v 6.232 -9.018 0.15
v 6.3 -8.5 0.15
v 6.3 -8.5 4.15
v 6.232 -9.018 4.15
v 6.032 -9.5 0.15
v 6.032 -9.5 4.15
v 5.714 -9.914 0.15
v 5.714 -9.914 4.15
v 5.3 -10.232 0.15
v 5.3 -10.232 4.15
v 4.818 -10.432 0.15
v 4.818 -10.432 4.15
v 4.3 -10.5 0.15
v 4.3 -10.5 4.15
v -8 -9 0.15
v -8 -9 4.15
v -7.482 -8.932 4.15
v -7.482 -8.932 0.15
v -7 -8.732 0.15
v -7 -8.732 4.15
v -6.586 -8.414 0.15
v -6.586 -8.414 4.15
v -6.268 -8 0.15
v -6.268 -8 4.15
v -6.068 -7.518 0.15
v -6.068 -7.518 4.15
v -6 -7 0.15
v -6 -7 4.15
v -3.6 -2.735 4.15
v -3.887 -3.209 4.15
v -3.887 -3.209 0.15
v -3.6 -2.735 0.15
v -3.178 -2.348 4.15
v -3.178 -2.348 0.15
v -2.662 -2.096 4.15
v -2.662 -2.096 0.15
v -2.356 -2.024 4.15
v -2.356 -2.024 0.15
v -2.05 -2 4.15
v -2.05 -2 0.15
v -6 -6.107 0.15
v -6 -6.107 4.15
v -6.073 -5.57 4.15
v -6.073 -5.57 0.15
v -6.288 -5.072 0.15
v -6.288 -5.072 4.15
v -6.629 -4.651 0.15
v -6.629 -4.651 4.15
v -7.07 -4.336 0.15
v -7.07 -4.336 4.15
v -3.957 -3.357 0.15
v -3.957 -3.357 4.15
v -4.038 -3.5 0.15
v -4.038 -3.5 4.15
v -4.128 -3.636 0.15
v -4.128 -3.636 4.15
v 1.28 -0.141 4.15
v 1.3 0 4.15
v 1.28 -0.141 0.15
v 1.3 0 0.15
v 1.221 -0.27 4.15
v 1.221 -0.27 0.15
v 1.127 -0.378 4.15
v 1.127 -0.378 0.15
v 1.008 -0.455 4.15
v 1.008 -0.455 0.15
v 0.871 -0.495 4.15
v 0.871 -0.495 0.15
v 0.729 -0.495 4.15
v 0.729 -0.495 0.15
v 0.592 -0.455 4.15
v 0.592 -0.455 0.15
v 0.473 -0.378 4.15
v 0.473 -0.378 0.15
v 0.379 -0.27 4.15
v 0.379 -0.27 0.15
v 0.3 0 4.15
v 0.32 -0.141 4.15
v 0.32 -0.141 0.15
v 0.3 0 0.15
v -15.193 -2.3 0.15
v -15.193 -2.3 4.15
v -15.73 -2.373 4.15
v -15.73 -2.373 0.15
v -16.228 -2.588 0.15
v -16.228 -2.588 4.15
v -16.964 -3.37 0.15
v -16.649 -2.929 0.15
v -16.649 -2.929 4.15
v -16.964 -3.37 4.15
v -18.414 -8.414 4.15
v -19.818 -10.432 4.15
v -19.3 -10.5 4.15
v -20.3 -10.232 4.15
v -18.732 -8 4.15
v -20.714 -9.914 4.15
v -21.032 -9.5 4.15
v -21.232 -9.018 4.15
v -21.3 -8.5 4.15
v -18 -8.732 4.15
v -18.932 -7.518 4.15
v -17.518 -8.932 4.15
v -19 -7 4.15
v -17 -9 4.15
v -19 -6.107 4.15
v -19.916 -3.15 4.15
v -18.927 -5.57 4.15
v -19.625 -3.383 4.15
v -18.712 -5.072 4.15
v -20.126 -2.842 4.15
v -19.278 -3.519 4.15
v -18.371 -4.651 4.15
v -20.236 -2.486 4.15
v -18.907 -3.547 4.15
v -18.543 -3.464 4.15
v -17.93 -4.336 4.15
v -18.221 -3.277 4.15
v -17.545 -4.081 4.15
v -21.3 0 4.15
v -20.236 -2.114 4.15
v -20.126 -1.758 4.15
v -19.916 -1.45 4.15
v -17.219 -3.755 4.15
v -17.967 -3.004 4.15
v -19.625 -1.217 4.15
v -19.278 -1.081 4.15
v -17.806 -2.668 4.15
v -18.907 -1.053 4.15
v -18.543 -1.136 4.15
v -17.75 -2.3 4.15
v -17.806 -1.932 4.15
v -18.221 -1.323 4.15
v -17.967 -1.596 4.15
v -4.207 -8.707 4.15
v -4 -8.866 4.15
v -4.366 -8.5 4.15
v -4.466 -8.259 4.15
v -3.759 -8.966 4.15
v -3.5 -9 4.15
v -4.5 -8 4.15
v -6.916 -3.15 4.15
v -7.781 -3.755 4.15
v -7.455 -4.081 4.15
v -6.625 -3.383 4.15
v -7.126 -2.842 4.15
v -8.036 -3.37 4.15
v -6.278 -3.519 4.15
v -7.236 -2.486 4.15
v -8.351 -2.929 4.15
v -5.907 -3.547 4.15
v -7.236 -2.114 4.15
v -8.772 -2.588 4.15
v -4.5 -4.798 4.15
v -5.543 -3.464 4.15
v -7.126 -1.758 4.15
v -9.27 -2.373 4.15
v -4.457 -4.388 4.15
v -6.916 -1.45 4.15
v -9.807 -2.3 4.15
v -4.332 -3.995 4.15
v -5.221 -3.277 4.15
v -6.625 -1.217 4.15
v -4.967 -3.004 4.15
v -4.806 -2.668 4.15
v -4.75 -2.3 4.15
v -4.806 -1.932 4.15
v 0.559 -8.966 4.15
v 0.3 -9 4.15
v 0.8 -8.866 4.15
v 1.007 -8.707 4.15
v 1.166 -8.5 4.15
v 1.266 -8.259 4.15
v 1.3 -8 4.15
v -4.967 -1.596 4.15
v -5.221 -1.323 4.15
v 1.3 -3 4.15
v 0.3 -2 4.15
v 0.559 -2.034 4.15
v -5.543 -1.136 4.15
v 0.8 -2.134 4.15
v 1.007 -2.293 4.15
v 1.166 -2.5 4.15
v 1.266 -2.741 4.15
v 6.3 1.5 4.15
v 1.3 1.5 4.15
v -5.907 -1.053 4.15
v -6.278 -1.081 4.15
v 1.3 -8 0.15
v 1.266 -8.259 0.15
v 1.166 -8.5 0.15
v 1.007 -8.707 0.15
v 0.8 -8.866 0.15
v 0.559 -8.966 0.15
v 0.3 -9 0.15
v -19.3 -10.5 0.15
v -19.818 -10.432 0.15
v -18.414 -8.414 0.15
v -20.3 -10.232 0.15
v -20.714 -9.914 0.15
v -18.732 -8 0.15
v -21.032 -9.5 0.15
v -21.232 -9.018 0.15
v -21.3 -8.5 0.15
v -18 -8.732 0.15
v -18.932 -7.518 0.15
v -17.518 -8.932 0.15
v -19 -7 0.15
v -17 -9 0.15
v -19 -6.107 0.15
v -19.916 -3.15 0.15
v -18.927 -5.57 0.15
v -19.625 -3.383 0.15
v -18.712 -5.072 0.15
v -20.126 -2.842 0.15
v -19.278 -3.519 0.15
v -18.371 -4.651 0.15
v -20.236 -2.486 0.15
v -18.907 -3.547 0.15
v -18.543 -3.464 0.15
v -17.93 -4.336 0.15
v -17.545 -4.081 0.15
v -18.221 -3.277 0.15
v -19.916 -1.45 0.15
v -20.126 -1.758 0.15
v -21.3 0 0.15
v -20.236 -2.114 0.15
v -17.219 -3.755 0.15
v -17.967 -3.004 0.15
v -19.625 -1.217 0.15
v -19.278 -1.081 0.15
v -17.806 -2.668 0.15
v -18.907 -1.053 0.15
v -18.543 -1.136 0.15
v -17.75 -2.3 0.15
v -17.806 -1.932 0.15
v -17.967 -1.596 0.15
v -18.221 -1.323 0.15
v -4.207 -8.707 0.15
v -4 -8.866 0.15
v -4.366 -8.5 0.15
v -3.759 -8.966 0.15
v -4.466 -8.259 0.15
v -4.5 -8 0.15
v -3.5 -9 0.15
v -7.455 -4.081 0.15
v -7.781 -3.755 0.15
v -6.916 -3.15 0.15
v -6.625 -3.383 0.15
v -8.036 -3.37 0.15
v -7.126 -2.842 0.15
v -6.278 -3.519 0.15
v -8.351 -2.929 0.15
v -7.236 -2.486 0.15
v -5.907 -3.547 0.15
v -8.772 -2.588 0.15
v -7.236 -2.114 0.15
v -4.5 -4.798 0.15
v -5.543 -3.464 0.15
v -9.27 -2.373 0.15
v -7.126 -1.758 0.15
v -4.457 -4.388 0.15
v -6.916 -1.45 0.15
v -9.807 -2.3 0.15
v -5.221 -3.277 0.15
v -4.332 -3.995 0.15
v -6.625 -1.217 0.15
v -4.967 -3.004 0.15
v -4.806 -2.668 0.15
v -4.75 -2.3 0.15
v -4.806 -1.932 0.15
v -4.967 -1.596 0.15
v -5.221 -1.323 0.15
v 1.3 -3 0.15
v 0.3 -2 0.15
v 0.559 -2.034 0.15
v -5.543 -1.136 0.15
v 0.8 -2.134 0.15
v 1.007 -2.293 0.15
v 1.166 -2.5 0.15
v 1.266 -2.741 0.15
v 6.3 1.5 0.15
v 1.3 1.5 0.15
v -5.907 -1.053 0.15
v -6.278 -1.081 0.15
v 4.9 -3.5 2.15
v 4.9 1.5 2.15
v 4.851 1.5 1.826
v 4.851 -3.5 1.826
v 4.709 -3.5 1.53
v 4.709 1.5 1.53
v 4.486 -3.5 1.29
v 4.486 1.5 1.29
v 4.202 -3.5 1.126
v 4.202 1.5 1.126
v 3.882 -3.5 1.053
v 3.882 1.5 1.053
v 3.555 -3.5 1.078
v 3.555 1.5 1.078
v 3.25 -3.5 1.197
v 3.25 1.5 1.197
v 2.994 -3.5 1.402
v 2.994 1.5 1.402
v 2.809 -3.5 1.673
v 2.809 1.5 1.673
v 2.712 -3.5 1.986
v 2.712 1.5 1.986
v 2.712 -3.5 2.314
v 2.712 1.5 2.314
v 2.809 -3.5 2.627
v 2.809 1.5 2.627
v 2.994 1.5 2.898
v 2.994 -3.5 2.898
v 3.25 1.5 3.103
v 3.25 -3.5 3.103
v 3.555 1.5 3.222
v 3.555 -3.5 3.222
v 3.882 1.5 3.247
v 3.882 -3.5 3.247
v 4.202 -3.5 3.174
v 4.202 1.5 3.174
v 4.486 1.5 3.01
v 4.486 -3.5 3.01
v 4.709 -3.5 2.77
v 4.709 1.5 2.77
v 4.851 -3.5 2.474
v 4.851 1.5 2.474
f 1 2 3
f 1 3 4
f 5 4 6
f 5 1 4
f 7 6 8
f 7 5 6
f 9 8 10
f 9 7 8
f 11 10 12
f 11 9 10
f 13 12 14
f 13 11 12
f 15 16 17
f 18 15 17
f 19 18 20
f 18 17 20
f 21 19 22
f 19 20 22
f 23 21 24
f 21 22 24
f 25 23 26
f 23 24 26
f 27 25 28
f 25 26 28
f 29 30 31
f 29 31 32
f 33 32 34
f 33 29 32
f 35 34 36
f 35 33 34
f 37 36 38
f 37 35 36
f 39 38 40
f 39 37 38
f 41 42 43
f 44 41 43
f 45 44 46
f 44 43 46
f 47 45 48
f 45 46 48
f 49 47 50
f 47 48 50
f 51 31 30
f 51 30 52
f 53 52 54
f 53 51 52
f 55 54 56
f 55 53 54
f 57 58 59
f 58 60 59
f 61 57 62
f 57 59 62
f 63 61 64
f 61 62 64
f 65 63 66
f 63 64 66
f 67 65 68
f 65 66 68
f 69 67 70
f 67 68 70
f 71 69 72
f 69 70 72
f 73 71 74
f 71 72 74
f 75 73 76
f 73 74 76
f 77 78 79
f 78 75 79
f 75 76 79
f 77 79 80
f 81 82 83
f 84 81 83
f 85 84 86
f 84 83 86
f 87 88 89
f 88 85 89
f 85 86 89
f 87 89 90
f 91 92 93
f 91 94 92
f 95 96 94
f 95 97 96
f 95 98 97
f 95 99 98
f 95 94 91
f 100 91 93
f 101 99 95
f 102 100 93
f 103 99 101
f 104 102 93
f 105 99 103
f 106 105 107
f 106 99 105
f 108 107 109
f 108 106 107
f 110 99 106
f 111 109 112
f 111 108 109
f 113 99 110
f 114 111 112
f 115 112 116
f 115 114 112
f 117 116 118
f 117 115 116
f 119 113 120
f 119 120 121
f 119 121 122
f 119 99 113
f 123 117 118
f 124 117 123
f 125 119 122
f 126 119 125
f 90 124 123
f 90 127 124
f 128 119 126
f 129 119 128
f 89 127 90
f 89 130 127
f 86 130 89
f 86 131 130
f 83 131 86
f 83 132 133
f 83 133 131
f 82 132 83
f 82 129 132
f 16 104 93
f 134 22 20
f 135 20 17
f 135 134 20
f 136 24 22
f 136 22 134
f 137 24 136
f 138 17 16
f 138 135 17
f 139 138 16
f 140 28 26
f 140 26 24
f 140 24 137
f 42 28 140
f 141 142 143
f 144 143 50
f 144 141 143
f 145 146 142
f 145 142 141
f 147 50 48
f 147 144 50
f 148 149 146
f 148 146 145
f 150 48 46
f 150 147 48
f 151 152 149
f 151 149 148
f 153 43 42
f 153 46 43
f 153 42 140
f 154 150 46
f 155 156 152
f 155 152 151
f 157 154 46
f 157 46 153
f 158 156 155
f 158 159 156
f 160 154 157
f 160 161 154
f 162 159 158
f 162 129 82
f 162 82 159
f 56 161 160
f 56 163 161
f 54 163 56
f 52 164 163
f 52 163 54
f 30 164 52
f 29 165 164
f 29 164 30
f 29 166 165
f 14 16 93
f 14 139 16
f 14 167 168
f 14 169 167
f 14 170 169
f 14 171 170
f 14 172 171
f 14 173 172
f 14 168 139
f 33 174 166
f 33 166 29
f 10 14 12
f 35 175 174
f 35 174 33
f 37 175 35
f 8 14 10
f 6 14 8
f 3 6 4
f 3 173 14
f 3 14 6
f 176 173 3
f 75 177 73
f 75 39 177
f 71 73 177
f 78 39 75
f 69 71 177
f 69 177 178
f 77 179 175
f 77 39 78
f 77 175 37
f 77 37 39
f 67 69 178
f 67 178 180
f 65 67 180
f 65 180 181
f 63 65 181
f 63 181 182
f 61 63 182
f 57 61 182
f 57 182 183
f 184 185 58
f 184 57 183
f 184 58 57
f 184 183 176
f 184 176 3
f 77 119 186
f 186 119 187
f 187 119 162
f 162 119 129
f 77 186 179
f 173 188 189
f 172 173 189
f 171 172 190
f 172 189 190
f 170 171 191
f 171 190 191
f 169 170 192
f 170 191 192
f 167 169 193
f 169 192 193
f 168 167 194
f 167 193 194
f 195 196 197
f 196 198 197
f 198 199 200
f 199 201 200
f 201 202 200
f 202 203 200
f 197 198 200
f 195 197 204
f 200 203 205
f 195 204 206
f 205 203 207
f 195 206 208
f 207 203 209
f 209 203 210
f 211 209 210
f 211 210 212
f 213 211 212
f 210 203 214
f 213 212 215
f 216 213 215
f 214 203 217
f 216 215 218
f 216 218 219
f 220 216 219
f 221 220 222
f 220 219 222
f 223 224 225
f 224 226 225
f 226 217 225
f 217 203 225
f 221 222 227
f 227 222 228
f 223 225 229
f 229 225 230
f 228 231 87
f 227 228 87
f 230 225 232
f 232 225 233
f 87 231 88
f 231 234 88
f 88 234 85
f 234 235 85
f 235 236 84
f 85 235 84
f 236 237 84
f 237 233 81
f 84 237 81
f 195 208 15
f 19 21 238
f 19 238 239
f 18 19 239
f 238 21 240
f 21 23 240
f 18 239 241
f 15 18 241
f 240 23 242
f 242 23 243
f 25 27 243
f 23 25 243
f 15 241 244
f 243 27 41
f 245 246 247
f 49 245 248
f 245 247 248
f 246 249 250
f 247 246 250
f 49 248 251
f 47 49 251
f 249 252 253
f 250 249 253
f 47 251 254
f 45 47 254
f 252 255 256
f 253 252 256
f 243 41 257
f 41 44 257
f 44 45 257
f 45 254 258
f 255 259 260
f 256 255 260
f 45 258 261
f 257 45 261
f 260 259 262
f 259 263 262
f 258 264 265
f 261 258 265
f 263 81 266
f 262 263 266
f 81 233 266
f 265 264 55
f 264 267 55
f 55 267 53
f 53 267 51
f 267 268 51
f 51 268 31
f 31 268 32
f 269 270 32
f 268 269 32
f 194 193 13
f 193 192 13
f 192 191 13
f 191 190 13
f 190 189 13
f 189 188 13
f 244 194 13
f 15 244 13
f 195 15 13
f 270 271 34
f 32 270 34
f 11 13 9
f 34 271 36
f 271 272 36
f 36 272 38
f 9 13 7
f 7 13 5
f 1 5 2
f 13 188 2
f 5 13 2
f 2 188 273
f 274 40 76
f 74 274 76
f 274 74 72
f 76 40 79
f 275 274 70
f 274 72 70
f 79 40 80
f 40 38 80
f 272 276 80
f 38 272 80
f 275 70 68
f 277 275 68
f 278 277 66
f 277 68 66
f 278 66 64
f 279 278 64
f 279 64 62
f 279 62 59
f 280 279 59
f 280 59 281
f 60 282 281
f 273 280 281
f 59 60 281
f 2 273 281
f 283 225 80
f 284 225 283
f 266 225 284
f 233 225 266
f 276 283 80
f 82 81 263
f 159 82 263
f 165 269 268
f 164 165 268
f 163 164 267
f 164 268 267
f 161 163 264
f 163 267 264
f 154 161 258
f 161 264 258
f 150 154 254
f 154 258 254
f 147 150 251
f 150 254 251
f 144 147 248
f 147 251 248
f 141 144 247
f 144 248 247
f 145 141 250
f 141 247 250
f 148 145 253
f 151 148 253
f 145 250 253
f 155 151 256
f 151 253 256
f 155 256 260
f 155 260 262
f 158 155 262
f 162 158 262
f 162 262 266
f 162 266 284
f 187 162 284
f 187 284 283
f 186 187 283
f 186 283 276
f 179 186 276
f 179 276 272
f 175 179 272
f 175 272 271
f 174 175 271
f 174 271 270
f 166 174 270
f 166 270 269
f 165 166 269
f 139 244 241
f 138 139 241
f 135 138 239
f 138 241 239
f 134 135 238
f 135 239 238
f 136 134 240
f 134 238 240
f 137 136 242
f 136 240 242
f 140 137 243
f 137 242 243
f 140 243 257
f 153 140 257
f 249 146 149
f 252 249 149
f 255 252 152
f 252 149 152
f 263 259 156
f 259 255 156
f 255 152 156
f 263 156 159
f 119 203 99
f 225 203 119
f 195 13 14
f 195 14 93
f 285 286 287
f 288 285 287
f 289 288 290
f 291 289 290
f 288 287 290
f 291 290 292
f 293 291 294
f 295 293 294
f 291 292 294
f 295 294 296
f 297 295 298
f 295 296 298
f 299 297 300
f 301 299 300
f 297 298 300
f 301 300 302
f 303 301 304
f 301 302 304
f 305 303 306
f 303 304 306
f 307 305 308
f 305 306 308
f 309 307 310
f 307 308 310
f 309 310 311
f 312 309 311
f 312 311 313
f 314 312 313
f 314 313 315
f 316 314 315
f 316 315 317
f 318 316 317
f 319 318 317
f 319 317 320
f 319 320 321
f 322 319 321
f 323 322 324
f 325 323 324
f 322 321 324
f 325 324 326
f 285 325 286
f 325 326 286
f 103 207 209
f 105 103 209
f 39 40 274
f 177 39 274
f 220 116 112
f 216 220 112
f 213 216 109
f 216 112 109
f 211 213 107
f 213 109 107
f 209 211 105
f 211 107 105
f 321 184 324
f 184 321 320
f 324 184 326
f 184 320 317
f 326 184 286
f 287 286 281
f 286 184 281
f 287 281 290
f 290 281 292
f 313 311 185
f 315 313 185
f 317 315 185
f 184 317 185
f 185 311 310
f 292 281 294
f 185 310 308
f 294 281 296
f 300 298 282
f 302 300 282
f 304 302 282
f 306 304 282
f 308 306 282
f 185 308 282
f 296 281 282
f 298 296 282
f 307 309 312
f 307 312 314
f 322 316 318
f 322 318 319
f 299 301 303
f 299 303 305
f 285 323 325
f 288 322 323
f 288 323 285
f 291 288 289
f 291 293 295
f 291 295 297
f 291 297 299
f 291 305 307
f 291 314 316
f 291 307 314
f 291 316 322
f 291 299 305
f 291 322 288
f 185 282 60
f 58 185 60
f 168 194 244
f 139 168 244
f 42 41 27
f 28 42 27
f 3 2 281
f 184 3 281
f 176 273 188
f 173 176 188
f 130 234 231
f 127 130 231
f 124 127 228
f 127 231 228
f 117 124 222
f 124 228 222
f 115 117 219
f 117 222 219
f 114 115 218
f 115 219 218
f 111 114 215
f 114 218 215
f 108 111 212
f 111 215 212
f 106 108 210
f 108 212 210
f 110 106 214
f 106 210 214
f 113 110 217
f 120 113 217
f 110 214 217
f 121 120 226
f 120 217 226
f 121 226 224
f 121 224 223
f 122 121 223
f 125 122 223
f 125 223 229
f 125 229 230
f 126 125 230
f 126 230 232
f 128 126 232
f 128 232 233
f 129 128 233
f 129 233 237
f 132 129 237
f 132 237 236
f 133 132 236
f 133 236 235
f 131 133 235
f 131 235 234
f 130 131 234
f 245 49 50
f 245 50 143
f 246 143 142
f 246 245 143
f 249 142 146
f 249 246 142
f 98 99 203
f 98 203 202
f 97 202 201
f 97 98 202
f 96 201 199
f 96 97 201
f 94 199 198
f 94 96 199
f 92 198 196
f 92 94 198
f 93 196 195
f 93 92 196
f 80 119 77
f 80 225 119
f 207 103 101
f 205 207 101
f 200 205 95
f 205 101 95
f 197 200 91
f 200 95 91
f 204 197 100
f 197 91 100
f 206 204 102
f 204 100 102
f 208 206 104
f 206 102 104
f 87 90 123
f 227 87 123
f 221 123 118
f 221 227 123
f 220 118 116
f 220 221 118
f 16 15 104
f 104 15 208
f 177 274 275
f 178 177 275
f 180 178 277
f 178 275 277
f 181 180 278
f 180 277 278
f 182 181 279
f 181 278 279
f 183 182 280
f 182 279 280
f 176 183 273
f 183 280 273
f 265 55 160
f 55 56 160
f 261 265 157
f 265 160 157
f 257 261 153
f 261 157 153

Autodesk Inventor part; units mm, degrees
ref_plane "YZ Plane" through (0, 0, 0) normal (1, 0, 0) x (0, 1, 0)
ref_plane "XZ Plane" through (0, 0, 0) normal (0, 1, 0) x (-1, 0, 0)
ref_plane "作業平面1" through (0, 0, 0.15) normal (0, 0, 1) x (1, 0, 0)
sketch "スケッチ1" plane through (0, 0, 0.15) normal (0, 0, 1) x (1, 0, 0)
  line L0 (0, -24) -> (-27.3, -24) projected
  line L1 (-3.7, -24) -> (-3.7, -10.5)
  line L2 (-3.7, -10.5) -> (4.3, -10.5)
  line L3 (6.3, -8.5) -> (6.3, 1.5)
  line L4 (6.3, 1.5) -> (1.3, 1.5)
  line L5 (-27.3, 0) -> (0, 0) projected
  line L6 (1.3, 1.5) -> (1.3, 0)
  circle A0 centre (-6, -21.7) radius 1.25 projected
  circle A1 centre (-19, -21.7) radius 1.25 projected
  circle A2 centre (-6, -21.7) radius 2.3 construction
  circle A3 centre (-19, -21.7) radius 2.3 construction
  line L7 (1.3, 0) -> (0, 0)
  line L8 (-21.3, -24) -> (-21.3, 0)
  circle A4 centre (-6, -2.3) radius 1.25 projected
  circle A5 centre (-19, -2.3) radius 1.25 projected
  line L9 (1.3, 0) -> (0.8, 0)
  arc A6 (0.3, 0) -> (1.3, 0) centre (0.8, 0) ccw
  line L10 (-6, -21.7) -> (-19, -21.7)
  line L11 (-19, -21.7) -> (-19, -2.3)
  line L12 (-19, -2.3) -> (-6, -2.3)
  line L13 (-6, -2.3) -> (-6, -21.7)
  arc A7 (-6, -19.4) -> (-8.3, -21.7) centre (-6, -21.7) ccw
  arc A8 (-16.7, -21.7) -> (-19, -19.4) centre (-19, -21.7) ccw
  arc A9 (-19, -4.6) -> (-16.7, -2.3) centre (-19, -2.3) ccw
  arc A10 (-8.3, -2.3) -> (-6, -4.6) centre (-6, -2.3) ccw
  arc A11 (4.3, -10.5) -> (6.3, -8.5) centre (4.3, -8.5) ccw
  line L14 (-3.5, -2) -> (0.3, -2)
  line L15 (1.3, -3) -> (1.3, -8)
  line L16 (0.3, -9) -> (-3.5, -9)
  line L17 (-4.5, -8) -> (-4.5, -3)
  arc A12 (0.3, -9) -> (1.3, -8) centre (0.3, -8) ccw
  arc A13 (1.3, -3) -> (0.3, -2) centre (0.3, -3) ccw
  arc A14 (-3.5, -2) -> (-4.5, -3) centre (-3.5, -3) ccw
  arc A15 (-4.5, -8) -> (-3.5, -9) centre (-3.5, -8) ccw
  arc A16 (-4.5, -4.0436) -> (-3.7196, -2) centre (-6, -2.3) ccw
  line L18 (-3.7, -10.5) -> (-21.3, -10.5)
  line L19 (-3.5, -9) -> (-21.3, -9)
  point P0 (6.3, -10.5)
  point P1 (0.8, -0.5)
  point P2 (-3.7167, -2.0238)
  point P3 (-6, -9)
  point P4 (-19, -9)
  dimension "d0" = 1.5
  dimension "d1" = 12
  dimension "d2" = 10
  dimension "d3" = 5
  dimension "d9" = 0.5
  dimension "d13" = 2
  dimension "d14" = 1
  dimension "d15" = 1.5
  dimension "d16" = 1.5
  dimension "d17" = 5
  dimension "d18" = 1.5
extrude "押し出し1" add sketch "スケッチ1" along normal blind 4 contours L18 L13 A4 L12 A5 L11 L19 L8 L5 L7 A6 L6 L4 L3 A11 L2 | L8 L19 L11 L18 | L18 L11 L19 L13 | A10 L12 A4 L13 | L11 A5 L12 A9 | L17 A14 A16
sketch "スケッチ2" plane through (1.3, 1.5, 0.15) normal (0, 1, 0) x (1, 0, 0)
  line L0 (5, 0) -> (5, -4) projected
  line L1 (0, 0) -> (-22.6, 0) projected
  line L2 (5, -4) -> (0, 0) construction
  circle A0 centre (2.5, -2) radius 1.1
  point P0 (-1.3, 0.15)
  dimension "d6" = 2.2
extrude "押し出し2" cut sketch "スケッチ2" against normal blind 5
fillet "フィレット1" radius 2 9 edges at (-19, -4.6, 2.15) (-16.7, -2.3, 2.15) (-8.3, -2.3, 2.15) (-6, -4.6, 2.15) (-4.5, -4.0436, 2.15) (-3.7167, -2.0238, 2.15) (-19, -9, 2.15) (-6, -9, 2.15) (-21.3, -10.5, 2.15)
sketch "スケッチ3" plane through (0, 0, 0.15) normal (0, 0, -1) x (-1, 0, 0)
  line L0 (21.3, 0) -> (21.3, -8.5) projected
  line L1 (-0.3, 0) -> (21.3, 0) projected
  arc A0 (-1.3, 0) -> (-0.3, 0) centre (-0.8, 0) ccw projected
  line L2 (-1.3, 1.5) -> (-1.3, 0) projected
  line L3 (-6.3, 1.5) -> (-1.3, 1.5) projected
  line L4 (-6.3, -8.5) -> (-6.3, 1.5) projected
  arc A1 (-6.3, -8.5) -> (-4.3, -10.5) centre (-4.3, -8.5) ccw projected
  line L5 (19.3, -10.5) -> (-4.3, -10.5) projected
  circle A2 centre (6, -2.3) radius 1.25 projected
  arc A3 (9.8066, -2.3) -> (8.0361, -3.3698) centre (9.8066, -4.3) ccw projected
  line L6 (15.1934, -2.3) -> (9.8066, -2.3) projected
  arc A4 (16.9639, -3.3698) -> (15.1934, -2.3) centre (15.1934, -4.3) ccw projected
  arc A5 (16.9639, -3.3698) -> (17.9302, -4.3361) centre (19, -2.3) ccw projected
  arc A6 (19, -6.1066) -> (17.9302, -4.3361) centre (17, -6.1066) ccw projected
  line L7 (19, -7) -> (19, -6.1066) projected
  line L8 (6, -6.1066) -> (6, -7) projected
  arc A7 (7.0698, -4.3361) -> (6, -6.1066) centre (8, -6.1066) ccw projected
  arc A8 (7.0698, -4.3361) -> (8.0361, -3.3698) centre (6, -2.3) ccw projected
  circle A9 centre (19, -2.3) radius 1.25 projected
  line L9 (2.0503, -2) -> (-0.3, -2) projected
  arc A10 (3.8874, -3.2093) -> (4.1279, -3.6361) centre (6, -2.3) ccw projected
  line L10 (4.5, -8) -> (4.5, -4.798) projected
  arc A11 (3.5, -9) -> (4.5, -8) centre (3.5, -8) ccw projected
  line L11 (-0.3, -9) -> (3.5, -9) projected
  arc A12 (-1.3, -8) -> (-0.3, -9) centre (-0.3, -8) ccw projected
  line L12 (-1.3, -3) -> (-1.3, -8) projected
  arc A13 (-0.3, -2) -> (-1.3, -3) centre (-0.3, -3) ccw projected
  arc A14 (3.8874, -3.2093) -> (2.0503, -2) centre (2.0503, -4) ccw projected
  arc A15 (4.5, -4.798) -> (4.1279, -3.6361) centre (2.5, -4.798) ccw projected
  line L13 (8, -9) -> (17, -9) projected
  arc A16 (6, -7) -> (8, -9) centre (8, -7) ccw projected
  arc A17 (17, -9) -> (19, -7) centre (17, -7) ccw projected
  arc A18 (19.3, -10.5) -> (21.3, -8.5) centre (19.3, -8.5) ccw projected
  point P0 (0, 0)
extrude "押し出し3" [suppressed]
properties part number "SolenoidMount"
